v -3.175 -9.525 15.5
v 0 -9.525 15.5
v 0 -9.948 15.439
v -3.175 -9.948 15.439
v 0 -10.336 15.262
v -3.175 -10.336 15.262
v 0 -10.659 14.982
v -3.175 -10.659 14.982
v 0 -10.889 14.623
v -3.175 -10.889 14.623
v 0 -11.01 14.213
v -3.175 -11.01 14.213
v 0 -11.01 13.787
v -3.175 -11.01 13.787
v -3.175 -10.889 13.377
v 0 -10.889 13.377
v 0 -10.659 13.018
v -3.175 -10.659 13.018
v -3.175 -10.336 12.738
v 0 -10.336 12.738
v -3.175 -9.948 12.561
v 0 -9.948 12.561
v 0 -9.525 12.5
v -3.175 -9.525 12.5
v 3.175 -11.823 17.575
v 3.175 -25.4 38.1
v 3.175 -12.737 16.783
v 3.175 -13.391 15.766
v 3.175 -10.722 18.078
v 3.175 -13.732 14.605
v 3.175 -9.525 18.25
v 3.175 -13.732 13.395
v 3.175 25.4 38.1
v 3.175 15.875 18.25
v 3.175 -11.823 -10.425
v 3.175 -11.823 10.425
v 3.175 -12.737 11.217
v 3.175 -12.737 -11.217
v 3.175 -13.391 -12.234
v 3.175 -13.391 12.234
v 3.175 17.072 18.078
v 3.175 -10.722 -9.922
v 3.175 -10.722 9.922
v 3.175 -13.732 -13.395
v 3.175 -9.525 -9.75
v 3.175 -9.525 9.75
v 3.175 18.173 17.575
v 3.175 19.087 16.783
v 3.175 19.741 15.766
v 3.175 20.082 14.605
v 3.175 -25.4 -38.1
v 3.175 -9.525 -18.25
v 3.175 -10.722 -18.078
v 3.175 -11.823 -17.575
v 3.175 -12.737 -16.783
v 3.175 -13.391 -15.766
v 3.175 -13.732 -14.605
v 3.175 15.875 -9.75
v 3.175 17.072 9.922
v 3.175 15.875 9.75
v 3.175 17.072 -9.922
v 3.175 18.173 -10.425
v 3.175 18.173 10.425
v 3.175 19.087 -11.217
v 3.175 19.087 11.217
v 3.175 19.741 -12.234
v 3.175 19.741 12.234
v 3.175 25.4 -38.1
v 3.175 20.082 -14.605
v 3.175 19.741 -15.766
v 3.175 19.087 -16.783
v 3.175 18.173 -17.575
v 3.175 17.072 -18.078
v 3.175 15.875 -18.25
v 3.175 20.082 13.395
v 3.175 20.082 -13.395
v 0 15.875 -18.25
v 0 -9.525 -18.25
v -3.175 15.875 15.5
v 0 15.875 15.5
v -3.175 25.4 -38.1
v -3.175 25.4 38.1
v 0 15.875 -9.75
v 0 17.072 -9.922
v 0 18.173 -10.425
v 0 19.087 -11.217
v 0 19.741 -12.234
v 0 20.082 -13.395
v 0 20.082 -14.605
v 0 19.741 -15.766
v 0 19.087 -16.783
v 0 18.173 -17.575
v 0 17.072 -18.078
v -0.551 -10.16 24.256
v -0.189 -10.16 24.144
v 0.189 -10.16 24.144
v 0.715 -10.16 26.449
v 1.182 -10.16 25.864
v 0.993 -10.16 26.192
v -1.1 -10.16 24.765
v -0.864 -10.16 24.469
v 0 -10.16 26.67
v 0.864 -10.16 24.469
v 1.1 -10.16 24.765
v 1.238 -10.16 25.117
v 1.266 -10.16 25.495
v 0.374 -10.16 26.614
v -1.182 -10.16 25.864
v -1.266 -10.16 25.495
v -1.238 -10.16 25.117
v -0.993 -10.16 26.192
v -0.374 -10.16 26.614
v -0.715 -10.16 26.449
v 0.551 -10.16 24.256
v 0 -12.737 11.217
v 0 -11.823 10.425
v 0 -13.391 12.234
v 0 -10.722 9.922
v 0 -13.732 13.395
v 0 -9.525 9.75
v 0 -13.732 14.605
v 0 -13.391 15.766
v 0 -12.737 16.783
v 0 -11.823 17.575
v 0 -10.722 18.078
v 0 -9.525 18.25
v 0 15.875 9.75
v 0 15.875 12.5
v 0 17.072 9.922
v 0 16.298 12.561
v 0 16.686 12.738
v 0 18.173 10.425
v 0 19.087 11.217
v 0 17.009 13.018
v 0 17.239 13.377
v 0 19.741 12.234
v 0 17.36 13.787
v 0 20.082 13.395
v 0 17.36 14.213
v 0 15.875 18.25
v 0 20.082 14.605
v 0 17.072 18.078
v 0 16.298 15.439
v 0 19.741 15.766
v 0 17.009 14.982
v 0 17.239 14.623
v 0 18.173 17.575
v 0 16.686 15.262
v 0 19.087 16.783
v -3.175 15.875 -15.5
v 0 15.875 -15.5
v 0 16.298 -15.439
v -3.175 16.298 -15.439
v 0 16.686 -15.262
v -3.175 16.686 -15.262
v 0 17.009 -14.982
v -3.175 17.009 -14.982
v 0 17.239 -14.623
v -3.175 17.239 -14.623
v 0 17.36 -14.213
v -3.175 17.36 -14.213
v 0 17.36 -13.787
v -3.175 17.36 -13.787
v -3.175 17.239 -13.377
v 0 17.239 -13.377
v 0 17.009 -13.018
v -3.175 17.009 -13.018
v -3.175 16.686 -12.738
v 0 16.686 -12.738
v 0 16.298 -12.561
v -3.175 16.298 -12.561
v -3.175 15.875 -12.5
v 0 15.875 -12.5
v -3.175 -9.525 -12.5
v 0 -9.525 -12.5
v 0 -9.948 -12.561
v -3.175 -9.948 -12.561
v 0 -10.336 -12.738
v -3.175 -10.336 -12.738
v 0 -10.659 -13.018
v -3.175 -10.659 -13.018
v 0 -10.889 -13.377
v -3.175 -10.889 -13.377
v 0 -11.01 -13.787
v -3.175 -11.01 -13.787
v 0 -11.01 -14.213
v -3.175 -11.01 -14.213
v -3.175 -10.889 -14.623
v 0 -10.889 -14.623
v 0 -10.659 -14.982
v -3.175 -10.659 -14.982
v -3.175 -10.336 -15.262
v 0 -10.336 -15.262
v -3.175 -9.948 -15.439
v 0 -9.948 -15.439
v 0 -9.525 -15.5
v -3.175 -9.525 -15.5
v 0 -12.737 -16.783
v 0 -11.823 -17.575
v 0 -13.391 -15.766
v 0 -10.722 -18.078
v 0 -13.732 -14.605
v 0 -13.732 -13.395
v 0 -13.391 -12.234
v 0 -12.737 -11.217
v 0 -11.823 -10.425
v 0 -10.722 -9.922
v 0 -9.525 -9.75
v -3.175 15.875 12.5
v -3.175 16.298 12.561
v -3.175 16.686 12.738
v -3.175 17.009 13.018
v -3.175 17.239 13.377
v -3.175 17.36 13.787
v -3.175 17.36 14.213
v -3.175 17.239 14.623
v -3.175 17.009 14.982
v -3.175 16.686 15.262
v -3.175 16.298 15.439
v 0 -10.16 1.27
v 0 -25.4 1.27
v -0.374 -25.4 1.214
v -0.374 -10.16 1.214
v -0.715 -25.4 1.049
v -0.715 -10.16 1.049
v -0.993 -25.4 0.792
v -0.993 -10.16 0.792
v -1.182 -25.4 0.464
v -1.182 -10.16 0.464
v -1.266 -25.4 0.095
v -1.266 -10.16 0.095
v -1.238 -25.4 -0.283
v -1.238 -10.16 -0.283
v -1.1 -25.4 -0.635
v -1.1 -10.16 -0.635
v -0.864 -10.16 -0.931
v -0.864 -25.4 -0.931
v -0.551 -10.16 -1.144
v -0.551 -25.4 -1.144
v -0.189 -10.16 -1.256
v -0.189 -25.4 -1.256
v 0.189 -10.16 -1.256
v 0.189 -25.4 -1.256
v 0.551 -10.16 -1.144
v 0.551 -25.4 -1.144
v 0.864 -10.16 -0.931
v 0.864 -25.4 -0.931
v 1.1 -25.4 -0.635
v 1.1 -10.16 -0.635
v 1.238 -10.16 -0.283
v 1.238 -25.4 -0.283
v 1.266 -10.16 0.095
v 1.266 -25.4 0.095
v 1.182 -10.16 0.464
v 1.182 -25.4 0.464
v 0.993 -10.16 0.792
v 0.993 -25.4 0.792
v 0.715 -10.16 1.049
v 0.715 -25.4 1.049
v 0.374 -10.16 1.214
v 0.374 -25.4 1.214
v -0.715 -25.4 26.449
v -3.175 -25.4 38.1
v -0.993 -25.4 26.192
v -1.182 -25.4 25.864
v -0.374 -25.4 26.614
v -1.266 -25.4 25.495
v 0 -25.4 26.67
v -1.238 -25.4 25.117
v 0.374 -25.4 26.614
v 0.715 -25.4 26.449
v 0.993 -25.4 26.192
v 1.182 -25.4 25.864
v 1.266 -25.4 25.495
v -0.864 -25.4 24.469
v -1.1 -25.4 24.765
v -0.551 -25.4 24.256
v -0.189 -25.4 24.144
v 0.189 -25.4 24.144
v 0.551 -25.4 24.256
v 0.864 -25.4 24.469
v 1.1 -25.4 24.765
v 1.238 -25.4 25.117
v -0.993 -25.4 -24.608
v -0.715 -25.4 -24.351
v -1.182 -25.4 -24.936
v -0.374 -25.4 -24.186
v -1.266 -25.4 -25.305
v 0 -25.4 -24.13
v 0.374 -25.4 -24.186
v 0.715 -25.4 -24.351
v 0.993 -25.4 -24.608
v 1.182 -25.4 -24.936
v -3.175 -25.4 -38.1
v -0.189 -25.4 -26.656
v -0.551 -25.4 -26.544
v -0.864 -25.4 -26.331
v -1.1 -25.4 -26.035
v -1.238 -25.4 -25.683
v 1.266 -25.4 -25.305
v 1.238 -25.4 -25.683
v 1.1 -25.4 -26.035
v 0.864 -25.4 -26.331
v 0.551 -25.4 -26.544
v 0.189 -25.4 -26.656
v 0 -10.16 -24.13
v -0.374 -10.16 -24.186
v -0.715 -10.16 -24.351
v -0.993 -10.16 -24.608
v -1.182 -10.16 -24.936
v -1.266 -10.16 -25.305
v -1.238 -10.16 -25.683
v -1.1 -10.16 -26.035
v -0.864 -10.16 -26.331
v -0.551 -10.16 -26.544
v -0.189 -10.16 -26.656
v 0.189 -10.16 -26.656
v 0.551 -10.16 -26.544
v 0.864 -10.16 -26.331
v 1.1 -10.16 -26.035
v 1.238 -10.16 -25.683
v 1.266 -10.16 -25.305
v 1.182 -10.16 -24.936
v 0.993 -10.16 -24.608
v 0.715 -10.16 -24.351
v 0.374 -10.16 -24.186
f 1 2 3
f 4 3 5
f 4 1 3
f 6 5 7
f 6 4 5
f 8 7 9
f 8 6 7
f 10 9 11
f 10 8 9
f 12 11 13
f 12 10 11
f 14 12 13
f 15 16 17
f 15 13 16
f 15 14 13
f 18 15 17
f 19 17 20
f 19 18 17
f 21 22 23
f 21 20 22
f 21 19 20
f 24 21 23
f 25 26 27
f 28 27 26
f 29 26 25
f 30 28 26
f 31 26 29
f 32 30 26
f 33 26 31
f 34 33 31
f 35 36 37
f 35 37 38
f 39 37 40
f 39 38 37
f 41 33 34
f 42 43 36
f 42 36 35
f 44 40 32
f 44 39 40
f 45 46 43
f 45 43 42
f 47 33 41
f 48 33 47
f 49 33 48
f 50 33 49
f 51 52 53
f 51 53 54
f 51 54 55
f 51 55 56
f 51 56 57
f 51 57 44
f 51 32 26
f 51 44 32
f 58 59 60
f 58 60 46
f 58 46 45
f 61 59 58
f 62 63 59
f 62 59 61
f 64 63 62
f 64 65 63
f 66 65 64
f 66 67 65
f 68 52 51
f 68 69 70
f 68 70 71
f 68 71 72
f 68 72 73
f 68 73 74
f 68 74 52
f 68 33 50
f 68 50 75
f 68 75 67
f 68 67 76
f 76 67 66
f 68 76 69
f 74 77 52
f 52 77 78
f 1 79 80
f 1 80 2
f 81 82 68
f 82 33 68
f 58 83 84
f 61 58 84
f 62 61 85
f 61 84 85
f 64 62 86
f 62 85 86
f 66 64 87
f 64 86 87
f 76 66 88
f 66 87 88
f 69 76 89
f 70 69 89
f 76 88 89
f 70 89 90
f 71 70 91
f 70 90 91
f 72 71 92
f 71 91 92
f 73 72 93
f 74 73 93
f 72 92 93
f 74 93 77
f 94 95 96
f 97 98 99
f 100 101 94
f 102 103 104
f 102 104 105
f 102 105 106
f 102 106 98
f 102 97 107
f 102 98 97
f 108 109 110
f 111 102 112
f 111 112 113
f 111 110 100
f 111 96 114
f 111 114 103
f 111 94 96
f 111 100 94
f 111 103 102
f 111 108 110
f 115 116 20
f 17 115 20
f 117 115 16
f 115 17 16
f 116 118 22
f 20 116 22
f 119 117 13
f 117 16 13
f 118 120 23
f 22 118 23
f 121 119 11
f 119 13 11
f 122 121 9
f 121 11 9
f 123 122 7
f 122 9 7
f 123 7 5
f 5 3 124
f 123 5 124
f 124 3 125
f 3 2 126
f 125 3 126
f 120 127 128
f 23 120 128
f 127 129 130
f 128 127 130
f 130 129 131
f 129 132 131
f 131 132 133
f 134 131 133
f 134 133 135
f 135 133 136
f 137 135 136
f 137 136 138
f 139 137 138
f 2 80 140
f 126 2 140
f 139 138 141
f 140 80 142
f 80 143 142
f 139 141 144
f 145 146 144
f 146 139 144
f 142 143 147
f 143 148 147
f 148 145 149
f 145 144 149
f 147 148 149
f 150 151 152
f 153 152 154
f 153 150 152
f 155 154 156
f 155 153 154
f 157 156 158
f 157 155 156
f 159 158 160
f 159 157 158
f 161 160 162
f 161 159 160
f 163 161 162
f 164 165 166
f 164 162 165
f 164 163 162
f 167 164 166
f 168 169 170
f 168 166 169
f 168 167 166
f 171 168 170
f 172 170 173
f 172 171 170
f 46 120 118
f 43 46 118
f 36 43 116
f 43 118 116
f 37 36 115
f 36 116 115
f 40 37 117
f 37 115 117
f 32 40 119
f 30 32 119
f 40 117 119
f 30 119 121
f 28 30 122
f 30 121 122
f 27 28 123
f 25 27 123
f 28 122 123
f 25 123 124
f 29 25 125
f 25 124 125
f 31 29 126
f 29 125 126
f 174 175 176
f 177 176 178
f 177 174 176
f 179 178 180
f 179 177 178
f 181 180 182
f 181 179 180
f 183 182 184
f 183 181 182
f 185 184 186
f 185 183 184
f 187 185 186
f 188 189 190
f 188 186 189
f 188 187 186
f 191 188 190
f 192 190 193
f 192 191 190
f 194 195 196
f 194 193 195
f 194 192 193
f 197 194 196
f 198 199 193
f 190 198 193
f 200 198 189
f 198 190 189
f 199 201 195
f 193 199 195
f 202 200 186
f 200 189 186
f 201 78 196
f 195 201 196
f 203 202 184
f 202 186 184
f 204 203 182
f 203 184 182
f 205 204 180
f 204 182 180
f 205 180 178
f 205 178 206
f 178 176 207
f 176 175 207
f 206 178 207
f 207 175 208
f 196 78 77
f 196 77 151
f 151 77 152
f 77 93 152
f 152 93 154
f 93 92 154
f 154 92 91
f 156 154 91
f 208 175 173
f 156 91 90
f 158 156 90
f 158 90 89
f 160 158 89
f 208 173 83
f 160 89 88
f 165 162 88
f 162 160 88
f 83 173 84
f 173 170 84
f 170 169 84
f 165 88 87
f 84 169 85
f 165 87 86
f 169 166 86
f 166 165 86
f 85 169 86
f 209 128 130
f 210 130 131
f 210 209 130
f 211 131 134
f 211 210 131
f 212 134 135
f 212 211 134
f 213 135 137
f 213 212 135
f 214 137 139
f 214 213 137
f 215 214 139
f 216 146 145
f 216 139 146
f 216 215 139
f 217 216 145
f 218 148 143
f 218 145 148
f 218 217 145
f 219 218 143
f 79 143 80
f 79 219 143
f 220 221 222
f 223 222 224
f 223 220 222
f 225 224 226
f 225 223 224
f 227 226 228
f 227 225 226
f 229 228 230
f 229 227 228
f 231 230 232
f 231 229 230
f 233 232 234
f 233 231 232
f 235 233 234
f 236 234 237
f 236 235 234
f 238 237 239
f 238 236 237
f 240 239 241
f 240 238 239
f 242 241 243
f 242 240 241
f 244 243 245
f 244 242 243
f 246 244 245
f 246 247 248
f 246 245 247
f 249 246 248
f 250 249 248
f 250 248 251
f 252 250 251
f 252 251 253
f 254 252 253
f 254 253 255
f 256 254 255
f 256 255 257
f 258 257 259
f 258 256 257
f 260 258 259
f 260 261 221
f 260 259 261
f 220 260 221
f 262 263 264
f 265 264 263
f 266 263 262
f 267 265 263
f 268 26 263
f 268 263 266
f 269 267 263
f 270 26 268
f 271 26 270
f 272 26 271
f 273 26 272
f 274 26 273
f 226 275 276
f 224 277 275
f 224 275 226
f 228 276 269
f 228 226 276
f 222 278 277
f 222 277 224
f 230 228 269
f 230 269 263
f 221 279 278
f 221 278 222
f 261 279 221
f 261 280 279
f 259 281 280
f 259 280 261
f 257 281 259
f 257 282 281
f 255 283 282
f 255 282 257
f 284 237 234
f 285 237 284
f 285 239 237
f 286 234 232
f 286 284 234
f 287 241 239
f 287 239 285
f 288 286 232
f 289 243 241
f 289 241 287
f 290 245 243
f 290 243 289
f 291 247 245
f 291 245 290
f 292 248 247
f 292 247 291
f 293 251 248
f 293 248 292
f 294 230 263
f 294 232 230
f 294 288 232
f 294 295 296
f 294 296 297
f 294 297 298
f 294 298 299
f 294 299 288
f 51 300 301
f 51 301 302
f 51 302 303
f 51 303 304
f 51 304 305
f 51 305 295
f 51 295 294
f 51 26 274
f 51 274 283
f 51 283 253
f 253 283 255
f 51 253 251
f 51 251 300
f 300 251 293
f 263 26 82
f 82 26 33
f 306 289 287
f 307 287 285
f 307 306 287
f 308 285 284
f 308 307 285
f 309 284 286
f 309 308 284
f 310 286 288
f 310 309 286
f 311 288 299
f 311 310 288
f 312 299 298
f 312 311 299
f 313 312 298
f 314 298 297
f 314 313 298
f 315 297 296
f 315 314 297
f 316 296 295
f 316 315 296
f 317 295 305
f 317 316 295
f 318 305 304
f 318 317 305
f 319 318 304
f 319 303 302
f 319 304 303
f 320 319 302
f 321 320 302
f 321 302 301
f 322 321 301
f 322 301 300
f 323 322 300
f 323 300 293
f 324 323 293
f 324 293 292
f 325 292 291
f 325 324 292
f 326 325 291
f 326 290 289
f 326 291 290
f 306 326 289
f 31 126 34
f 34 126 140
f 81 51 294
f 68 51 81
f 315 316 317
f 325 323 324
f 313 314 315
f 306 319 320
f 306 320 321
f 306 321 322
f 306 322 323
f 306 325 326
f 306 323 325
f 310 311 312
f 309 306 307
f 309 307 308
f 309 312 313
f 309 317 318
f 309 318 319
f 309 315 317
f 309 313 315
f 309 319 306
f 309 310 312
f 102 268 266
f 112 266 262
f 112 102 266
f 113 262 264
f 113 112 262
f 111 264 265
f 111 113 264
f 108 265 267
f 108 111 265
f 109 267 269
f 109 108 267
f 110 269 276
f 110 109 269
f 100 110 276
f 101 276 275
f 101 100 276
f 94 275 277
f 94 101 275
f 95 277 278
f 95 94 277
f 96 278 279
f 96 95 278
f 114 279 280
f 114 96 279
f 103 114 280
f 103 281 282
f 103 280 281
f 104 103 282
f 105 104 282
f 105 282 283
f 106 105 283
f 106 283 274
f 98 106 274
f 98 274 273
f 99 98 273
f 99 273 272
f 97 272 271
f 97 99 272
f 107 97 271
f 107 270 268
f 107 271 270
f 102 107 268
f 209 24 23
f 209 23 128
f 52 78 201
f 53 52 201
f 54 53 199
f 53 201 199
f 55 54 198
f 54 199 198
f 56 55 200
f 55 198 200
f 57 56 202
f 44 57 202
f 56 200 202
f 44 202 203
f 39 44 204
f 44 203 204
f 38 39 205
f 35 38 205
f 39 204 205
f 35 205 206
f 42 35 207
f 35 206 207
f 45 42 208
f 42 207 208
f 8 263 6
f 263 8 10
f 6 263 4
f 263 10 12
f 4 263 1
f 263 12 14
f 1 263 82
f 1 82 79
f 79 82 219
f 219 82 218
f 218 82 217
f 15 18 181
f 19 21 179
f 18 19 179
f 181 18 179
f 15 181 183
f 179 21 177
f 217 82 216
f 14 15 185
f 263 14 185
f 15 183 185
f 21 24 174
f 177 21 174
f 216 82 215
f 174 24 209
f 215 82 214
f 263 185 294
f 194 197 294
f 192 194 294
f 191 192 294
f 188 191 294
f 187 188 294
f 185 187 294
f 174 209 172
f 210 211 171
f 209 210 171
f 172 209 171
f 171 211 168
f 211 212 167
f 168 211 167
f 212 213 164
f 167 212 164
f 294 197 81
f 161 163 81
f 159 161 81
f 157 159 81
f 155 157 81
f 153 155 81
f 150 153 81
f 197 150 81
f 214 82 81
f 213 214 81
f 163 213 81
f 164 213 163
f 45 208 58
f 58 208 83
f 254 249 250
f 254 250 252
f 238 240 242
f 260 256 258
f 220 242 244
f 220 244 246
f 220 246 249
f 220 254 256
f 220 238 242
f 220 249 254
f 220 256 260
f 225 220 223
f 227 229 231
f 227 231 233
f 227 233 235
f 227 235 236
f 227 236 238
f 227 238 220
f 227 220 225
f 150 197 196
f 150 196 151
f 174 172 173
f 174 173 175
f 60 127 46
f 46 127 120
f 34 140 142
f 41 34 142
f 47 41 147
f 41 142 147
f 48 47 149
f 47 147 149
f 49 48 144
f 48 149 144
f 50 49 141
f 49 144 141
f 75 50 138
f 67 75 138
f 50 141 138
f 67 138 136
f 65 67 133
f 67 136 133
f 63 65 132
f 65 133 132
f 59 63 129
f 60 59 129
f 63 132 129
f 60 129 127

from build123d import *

# Parameters (mm, degrees)
SKETCH2_W               = 76.2
SKETCH2_H               = 50.8
BOSS_EXTRUDE2_DEPTH     = 3.175
CUT_EXTRUDE1_DEPTH      = 47.228697797
CUT_EXTRUDE1_DEPTH_BACK = 47.228697797
CUT_EXTRUDE3_START      = -3.175
CUT_EXTRUDE3_DEPTH      = 3.175
CUT_EXTRUDE2_DEPTH      = 64.579325453
CUT_EXTRUDE2_DEPTH_BACK = 15.24
SKETCH4_R               = 1.27


with BuildPart() as part:
    # Sketch2 → Boss-Extrude2 (new, symmetric)
    with BuildSketch(Plane(origin=(0, 0, 0), x_dir=(0, 0, -1), z_dir=(1, 0, 0))):
        Rectangle(SKETCH2_W, SKETCH2_H)
    extrude(amount=BOSS_EXTRUDE2_DEPTH, both=True)

    # Sketch3 → Cut-Extrude1 (cut, two sides: drawn at the far end of the back side and taken through both)
    with BuildSketch(Plane(origin=(3.175, 0, 0), x_dir=(0, 0, -1), z_dir=(1, 0, 0)).offset(-CUT_EXTRUDE1_DEPTH_BACK)):
        with BuildLine():
            Line((-15.500000048, 15.875), (-15.500000048, -9.525))
            ThreePointArc((-15.500000048, -9.525), (-14, -11.025000048), (-12.499999952, -9.525))
            Line((-12.499999952, -9.525), (-12.499999952, 15.875))
            ThreePointArc((-12.499999952, 15.875), (-14, 17.375000048), (-15.500000048, 15.875))
        make_face()
        with BuildLine():
            Line((12.499999952, 15.875), (12.499999952, -9.525))
            ThreePointArc((12.499999952, -9.525), (14, -11.025000048), (15.500000048, -9.525))
            Line((15.500000048, -9.525), (15.500000048, 15.875))
            ThreePointArc((15.500000048, 15.875), (14, 17.375000048), (12.499999952, 15.875))
        make_face()
    extrude(amount=CUT_EXTRUDE1_DEPTH + CUT_EXTRUDE1_DEPTH_BACK, mode=Mode.SUBTRACT)

    # Sketch3<3> → Cut-Extrude3 (cut)
    # profile 1 of 2: a face of its own
    with BuildSketch(Plane(origin=(3.175, 0, 0), x_dir=(0, 0, -1), z_dir=(1, 0, 0)).offset(CUT_EXTRUDE3_START)):
        with BuildLine():
            Line((-18.250000009, -9.525), (-18.250000009, 15.875))
            ThreePointArc((-18.250000009, 15.875), (-14, 20.125000009), (-9.749999991, 15.875))
            Line((-9.749999991, 15.875), (-9.749999991, -9.525))
            ThreePointArc((-9.749999991, -9.525), (-14, -13.775000009), (-18.250000009, -9.525))
        make_face()
        with BuildLine():
            Line((-15.500000048, -9.525), (-15.500000048, 15.875))
            ThreePointArc((-15.500000048, 15.875), (-14, 17.375000048), (-12.499999952, 15.875))
            Line((-12.499999952, 15.875), (-12.499999952, -9.525))
            ThreePointArc((-12.499999952, -9.525), (-14, -11.025000048), (-15.500000048, -9.525))
        make_face(mode=Mode.SUBTRACT)
    # profile 2 of 2: a face of its own
    with BuildSketch(Plane(origin=(3.175, 0, 0), x_dir=(0, 0, -1), z_dir=(1, 0, 0)).offset(CUT_EXTRUDE3_START)):
        with BuildLine():
            Line((9.749999991, -9.525), (9.749999991, 15.875))
            ThreePointArc((9.749999991, 15.875), (14, 20.125000009), (18.250000009, 15.875))
            Line((18.250000009, 15.875), (18.250000009, -9.525))
            ThreePointArc((18.250000009, -9.525), (14, -13.775000009), (9.749999991, -9.525))
        make_face()
        with BuildLine():
            Line((12.499999952, -9.525), (12.499999952, 15.875))
            ThreePointArc((12.499999952, 15.875), (14, 17.375000048), (15.500000048, 15.875))
            Line((15.500000048, 15.875), (15.500000048, -9.525))
            ThreePointArc((15.500000048, -9.525), (14, -11.025000048), (12.499999952, -9.525))
        make_face(mode=Mode.SUBTRACT)
    extrude(amount=CUT_EXTRUDE3_DEPTH, mode=Mode.SUBTRACT)

    # Sketch4 → Cut-Extrude2 (cut, two sides: drawn at the far end of the back side and taken through both)
    with BuildSketch(Plane.XZ.offset(25.4).offset(-CUT_EXTRUDE2_DEPTH_BACK)):
        with Locations((0, 25.4)):
            Circle(SKETCH4_R)
        Circle(SKETCH4_R)
        with Locations((0, -25.4)):
            Circle(SKETCH4_R)
    extrude(amount=CUT_EXTRUDE2_DEPTH + CUT_EXTRUDE2_DEPTH_BACK, mode=Mode.SUBTRACT)


solid = part.part
